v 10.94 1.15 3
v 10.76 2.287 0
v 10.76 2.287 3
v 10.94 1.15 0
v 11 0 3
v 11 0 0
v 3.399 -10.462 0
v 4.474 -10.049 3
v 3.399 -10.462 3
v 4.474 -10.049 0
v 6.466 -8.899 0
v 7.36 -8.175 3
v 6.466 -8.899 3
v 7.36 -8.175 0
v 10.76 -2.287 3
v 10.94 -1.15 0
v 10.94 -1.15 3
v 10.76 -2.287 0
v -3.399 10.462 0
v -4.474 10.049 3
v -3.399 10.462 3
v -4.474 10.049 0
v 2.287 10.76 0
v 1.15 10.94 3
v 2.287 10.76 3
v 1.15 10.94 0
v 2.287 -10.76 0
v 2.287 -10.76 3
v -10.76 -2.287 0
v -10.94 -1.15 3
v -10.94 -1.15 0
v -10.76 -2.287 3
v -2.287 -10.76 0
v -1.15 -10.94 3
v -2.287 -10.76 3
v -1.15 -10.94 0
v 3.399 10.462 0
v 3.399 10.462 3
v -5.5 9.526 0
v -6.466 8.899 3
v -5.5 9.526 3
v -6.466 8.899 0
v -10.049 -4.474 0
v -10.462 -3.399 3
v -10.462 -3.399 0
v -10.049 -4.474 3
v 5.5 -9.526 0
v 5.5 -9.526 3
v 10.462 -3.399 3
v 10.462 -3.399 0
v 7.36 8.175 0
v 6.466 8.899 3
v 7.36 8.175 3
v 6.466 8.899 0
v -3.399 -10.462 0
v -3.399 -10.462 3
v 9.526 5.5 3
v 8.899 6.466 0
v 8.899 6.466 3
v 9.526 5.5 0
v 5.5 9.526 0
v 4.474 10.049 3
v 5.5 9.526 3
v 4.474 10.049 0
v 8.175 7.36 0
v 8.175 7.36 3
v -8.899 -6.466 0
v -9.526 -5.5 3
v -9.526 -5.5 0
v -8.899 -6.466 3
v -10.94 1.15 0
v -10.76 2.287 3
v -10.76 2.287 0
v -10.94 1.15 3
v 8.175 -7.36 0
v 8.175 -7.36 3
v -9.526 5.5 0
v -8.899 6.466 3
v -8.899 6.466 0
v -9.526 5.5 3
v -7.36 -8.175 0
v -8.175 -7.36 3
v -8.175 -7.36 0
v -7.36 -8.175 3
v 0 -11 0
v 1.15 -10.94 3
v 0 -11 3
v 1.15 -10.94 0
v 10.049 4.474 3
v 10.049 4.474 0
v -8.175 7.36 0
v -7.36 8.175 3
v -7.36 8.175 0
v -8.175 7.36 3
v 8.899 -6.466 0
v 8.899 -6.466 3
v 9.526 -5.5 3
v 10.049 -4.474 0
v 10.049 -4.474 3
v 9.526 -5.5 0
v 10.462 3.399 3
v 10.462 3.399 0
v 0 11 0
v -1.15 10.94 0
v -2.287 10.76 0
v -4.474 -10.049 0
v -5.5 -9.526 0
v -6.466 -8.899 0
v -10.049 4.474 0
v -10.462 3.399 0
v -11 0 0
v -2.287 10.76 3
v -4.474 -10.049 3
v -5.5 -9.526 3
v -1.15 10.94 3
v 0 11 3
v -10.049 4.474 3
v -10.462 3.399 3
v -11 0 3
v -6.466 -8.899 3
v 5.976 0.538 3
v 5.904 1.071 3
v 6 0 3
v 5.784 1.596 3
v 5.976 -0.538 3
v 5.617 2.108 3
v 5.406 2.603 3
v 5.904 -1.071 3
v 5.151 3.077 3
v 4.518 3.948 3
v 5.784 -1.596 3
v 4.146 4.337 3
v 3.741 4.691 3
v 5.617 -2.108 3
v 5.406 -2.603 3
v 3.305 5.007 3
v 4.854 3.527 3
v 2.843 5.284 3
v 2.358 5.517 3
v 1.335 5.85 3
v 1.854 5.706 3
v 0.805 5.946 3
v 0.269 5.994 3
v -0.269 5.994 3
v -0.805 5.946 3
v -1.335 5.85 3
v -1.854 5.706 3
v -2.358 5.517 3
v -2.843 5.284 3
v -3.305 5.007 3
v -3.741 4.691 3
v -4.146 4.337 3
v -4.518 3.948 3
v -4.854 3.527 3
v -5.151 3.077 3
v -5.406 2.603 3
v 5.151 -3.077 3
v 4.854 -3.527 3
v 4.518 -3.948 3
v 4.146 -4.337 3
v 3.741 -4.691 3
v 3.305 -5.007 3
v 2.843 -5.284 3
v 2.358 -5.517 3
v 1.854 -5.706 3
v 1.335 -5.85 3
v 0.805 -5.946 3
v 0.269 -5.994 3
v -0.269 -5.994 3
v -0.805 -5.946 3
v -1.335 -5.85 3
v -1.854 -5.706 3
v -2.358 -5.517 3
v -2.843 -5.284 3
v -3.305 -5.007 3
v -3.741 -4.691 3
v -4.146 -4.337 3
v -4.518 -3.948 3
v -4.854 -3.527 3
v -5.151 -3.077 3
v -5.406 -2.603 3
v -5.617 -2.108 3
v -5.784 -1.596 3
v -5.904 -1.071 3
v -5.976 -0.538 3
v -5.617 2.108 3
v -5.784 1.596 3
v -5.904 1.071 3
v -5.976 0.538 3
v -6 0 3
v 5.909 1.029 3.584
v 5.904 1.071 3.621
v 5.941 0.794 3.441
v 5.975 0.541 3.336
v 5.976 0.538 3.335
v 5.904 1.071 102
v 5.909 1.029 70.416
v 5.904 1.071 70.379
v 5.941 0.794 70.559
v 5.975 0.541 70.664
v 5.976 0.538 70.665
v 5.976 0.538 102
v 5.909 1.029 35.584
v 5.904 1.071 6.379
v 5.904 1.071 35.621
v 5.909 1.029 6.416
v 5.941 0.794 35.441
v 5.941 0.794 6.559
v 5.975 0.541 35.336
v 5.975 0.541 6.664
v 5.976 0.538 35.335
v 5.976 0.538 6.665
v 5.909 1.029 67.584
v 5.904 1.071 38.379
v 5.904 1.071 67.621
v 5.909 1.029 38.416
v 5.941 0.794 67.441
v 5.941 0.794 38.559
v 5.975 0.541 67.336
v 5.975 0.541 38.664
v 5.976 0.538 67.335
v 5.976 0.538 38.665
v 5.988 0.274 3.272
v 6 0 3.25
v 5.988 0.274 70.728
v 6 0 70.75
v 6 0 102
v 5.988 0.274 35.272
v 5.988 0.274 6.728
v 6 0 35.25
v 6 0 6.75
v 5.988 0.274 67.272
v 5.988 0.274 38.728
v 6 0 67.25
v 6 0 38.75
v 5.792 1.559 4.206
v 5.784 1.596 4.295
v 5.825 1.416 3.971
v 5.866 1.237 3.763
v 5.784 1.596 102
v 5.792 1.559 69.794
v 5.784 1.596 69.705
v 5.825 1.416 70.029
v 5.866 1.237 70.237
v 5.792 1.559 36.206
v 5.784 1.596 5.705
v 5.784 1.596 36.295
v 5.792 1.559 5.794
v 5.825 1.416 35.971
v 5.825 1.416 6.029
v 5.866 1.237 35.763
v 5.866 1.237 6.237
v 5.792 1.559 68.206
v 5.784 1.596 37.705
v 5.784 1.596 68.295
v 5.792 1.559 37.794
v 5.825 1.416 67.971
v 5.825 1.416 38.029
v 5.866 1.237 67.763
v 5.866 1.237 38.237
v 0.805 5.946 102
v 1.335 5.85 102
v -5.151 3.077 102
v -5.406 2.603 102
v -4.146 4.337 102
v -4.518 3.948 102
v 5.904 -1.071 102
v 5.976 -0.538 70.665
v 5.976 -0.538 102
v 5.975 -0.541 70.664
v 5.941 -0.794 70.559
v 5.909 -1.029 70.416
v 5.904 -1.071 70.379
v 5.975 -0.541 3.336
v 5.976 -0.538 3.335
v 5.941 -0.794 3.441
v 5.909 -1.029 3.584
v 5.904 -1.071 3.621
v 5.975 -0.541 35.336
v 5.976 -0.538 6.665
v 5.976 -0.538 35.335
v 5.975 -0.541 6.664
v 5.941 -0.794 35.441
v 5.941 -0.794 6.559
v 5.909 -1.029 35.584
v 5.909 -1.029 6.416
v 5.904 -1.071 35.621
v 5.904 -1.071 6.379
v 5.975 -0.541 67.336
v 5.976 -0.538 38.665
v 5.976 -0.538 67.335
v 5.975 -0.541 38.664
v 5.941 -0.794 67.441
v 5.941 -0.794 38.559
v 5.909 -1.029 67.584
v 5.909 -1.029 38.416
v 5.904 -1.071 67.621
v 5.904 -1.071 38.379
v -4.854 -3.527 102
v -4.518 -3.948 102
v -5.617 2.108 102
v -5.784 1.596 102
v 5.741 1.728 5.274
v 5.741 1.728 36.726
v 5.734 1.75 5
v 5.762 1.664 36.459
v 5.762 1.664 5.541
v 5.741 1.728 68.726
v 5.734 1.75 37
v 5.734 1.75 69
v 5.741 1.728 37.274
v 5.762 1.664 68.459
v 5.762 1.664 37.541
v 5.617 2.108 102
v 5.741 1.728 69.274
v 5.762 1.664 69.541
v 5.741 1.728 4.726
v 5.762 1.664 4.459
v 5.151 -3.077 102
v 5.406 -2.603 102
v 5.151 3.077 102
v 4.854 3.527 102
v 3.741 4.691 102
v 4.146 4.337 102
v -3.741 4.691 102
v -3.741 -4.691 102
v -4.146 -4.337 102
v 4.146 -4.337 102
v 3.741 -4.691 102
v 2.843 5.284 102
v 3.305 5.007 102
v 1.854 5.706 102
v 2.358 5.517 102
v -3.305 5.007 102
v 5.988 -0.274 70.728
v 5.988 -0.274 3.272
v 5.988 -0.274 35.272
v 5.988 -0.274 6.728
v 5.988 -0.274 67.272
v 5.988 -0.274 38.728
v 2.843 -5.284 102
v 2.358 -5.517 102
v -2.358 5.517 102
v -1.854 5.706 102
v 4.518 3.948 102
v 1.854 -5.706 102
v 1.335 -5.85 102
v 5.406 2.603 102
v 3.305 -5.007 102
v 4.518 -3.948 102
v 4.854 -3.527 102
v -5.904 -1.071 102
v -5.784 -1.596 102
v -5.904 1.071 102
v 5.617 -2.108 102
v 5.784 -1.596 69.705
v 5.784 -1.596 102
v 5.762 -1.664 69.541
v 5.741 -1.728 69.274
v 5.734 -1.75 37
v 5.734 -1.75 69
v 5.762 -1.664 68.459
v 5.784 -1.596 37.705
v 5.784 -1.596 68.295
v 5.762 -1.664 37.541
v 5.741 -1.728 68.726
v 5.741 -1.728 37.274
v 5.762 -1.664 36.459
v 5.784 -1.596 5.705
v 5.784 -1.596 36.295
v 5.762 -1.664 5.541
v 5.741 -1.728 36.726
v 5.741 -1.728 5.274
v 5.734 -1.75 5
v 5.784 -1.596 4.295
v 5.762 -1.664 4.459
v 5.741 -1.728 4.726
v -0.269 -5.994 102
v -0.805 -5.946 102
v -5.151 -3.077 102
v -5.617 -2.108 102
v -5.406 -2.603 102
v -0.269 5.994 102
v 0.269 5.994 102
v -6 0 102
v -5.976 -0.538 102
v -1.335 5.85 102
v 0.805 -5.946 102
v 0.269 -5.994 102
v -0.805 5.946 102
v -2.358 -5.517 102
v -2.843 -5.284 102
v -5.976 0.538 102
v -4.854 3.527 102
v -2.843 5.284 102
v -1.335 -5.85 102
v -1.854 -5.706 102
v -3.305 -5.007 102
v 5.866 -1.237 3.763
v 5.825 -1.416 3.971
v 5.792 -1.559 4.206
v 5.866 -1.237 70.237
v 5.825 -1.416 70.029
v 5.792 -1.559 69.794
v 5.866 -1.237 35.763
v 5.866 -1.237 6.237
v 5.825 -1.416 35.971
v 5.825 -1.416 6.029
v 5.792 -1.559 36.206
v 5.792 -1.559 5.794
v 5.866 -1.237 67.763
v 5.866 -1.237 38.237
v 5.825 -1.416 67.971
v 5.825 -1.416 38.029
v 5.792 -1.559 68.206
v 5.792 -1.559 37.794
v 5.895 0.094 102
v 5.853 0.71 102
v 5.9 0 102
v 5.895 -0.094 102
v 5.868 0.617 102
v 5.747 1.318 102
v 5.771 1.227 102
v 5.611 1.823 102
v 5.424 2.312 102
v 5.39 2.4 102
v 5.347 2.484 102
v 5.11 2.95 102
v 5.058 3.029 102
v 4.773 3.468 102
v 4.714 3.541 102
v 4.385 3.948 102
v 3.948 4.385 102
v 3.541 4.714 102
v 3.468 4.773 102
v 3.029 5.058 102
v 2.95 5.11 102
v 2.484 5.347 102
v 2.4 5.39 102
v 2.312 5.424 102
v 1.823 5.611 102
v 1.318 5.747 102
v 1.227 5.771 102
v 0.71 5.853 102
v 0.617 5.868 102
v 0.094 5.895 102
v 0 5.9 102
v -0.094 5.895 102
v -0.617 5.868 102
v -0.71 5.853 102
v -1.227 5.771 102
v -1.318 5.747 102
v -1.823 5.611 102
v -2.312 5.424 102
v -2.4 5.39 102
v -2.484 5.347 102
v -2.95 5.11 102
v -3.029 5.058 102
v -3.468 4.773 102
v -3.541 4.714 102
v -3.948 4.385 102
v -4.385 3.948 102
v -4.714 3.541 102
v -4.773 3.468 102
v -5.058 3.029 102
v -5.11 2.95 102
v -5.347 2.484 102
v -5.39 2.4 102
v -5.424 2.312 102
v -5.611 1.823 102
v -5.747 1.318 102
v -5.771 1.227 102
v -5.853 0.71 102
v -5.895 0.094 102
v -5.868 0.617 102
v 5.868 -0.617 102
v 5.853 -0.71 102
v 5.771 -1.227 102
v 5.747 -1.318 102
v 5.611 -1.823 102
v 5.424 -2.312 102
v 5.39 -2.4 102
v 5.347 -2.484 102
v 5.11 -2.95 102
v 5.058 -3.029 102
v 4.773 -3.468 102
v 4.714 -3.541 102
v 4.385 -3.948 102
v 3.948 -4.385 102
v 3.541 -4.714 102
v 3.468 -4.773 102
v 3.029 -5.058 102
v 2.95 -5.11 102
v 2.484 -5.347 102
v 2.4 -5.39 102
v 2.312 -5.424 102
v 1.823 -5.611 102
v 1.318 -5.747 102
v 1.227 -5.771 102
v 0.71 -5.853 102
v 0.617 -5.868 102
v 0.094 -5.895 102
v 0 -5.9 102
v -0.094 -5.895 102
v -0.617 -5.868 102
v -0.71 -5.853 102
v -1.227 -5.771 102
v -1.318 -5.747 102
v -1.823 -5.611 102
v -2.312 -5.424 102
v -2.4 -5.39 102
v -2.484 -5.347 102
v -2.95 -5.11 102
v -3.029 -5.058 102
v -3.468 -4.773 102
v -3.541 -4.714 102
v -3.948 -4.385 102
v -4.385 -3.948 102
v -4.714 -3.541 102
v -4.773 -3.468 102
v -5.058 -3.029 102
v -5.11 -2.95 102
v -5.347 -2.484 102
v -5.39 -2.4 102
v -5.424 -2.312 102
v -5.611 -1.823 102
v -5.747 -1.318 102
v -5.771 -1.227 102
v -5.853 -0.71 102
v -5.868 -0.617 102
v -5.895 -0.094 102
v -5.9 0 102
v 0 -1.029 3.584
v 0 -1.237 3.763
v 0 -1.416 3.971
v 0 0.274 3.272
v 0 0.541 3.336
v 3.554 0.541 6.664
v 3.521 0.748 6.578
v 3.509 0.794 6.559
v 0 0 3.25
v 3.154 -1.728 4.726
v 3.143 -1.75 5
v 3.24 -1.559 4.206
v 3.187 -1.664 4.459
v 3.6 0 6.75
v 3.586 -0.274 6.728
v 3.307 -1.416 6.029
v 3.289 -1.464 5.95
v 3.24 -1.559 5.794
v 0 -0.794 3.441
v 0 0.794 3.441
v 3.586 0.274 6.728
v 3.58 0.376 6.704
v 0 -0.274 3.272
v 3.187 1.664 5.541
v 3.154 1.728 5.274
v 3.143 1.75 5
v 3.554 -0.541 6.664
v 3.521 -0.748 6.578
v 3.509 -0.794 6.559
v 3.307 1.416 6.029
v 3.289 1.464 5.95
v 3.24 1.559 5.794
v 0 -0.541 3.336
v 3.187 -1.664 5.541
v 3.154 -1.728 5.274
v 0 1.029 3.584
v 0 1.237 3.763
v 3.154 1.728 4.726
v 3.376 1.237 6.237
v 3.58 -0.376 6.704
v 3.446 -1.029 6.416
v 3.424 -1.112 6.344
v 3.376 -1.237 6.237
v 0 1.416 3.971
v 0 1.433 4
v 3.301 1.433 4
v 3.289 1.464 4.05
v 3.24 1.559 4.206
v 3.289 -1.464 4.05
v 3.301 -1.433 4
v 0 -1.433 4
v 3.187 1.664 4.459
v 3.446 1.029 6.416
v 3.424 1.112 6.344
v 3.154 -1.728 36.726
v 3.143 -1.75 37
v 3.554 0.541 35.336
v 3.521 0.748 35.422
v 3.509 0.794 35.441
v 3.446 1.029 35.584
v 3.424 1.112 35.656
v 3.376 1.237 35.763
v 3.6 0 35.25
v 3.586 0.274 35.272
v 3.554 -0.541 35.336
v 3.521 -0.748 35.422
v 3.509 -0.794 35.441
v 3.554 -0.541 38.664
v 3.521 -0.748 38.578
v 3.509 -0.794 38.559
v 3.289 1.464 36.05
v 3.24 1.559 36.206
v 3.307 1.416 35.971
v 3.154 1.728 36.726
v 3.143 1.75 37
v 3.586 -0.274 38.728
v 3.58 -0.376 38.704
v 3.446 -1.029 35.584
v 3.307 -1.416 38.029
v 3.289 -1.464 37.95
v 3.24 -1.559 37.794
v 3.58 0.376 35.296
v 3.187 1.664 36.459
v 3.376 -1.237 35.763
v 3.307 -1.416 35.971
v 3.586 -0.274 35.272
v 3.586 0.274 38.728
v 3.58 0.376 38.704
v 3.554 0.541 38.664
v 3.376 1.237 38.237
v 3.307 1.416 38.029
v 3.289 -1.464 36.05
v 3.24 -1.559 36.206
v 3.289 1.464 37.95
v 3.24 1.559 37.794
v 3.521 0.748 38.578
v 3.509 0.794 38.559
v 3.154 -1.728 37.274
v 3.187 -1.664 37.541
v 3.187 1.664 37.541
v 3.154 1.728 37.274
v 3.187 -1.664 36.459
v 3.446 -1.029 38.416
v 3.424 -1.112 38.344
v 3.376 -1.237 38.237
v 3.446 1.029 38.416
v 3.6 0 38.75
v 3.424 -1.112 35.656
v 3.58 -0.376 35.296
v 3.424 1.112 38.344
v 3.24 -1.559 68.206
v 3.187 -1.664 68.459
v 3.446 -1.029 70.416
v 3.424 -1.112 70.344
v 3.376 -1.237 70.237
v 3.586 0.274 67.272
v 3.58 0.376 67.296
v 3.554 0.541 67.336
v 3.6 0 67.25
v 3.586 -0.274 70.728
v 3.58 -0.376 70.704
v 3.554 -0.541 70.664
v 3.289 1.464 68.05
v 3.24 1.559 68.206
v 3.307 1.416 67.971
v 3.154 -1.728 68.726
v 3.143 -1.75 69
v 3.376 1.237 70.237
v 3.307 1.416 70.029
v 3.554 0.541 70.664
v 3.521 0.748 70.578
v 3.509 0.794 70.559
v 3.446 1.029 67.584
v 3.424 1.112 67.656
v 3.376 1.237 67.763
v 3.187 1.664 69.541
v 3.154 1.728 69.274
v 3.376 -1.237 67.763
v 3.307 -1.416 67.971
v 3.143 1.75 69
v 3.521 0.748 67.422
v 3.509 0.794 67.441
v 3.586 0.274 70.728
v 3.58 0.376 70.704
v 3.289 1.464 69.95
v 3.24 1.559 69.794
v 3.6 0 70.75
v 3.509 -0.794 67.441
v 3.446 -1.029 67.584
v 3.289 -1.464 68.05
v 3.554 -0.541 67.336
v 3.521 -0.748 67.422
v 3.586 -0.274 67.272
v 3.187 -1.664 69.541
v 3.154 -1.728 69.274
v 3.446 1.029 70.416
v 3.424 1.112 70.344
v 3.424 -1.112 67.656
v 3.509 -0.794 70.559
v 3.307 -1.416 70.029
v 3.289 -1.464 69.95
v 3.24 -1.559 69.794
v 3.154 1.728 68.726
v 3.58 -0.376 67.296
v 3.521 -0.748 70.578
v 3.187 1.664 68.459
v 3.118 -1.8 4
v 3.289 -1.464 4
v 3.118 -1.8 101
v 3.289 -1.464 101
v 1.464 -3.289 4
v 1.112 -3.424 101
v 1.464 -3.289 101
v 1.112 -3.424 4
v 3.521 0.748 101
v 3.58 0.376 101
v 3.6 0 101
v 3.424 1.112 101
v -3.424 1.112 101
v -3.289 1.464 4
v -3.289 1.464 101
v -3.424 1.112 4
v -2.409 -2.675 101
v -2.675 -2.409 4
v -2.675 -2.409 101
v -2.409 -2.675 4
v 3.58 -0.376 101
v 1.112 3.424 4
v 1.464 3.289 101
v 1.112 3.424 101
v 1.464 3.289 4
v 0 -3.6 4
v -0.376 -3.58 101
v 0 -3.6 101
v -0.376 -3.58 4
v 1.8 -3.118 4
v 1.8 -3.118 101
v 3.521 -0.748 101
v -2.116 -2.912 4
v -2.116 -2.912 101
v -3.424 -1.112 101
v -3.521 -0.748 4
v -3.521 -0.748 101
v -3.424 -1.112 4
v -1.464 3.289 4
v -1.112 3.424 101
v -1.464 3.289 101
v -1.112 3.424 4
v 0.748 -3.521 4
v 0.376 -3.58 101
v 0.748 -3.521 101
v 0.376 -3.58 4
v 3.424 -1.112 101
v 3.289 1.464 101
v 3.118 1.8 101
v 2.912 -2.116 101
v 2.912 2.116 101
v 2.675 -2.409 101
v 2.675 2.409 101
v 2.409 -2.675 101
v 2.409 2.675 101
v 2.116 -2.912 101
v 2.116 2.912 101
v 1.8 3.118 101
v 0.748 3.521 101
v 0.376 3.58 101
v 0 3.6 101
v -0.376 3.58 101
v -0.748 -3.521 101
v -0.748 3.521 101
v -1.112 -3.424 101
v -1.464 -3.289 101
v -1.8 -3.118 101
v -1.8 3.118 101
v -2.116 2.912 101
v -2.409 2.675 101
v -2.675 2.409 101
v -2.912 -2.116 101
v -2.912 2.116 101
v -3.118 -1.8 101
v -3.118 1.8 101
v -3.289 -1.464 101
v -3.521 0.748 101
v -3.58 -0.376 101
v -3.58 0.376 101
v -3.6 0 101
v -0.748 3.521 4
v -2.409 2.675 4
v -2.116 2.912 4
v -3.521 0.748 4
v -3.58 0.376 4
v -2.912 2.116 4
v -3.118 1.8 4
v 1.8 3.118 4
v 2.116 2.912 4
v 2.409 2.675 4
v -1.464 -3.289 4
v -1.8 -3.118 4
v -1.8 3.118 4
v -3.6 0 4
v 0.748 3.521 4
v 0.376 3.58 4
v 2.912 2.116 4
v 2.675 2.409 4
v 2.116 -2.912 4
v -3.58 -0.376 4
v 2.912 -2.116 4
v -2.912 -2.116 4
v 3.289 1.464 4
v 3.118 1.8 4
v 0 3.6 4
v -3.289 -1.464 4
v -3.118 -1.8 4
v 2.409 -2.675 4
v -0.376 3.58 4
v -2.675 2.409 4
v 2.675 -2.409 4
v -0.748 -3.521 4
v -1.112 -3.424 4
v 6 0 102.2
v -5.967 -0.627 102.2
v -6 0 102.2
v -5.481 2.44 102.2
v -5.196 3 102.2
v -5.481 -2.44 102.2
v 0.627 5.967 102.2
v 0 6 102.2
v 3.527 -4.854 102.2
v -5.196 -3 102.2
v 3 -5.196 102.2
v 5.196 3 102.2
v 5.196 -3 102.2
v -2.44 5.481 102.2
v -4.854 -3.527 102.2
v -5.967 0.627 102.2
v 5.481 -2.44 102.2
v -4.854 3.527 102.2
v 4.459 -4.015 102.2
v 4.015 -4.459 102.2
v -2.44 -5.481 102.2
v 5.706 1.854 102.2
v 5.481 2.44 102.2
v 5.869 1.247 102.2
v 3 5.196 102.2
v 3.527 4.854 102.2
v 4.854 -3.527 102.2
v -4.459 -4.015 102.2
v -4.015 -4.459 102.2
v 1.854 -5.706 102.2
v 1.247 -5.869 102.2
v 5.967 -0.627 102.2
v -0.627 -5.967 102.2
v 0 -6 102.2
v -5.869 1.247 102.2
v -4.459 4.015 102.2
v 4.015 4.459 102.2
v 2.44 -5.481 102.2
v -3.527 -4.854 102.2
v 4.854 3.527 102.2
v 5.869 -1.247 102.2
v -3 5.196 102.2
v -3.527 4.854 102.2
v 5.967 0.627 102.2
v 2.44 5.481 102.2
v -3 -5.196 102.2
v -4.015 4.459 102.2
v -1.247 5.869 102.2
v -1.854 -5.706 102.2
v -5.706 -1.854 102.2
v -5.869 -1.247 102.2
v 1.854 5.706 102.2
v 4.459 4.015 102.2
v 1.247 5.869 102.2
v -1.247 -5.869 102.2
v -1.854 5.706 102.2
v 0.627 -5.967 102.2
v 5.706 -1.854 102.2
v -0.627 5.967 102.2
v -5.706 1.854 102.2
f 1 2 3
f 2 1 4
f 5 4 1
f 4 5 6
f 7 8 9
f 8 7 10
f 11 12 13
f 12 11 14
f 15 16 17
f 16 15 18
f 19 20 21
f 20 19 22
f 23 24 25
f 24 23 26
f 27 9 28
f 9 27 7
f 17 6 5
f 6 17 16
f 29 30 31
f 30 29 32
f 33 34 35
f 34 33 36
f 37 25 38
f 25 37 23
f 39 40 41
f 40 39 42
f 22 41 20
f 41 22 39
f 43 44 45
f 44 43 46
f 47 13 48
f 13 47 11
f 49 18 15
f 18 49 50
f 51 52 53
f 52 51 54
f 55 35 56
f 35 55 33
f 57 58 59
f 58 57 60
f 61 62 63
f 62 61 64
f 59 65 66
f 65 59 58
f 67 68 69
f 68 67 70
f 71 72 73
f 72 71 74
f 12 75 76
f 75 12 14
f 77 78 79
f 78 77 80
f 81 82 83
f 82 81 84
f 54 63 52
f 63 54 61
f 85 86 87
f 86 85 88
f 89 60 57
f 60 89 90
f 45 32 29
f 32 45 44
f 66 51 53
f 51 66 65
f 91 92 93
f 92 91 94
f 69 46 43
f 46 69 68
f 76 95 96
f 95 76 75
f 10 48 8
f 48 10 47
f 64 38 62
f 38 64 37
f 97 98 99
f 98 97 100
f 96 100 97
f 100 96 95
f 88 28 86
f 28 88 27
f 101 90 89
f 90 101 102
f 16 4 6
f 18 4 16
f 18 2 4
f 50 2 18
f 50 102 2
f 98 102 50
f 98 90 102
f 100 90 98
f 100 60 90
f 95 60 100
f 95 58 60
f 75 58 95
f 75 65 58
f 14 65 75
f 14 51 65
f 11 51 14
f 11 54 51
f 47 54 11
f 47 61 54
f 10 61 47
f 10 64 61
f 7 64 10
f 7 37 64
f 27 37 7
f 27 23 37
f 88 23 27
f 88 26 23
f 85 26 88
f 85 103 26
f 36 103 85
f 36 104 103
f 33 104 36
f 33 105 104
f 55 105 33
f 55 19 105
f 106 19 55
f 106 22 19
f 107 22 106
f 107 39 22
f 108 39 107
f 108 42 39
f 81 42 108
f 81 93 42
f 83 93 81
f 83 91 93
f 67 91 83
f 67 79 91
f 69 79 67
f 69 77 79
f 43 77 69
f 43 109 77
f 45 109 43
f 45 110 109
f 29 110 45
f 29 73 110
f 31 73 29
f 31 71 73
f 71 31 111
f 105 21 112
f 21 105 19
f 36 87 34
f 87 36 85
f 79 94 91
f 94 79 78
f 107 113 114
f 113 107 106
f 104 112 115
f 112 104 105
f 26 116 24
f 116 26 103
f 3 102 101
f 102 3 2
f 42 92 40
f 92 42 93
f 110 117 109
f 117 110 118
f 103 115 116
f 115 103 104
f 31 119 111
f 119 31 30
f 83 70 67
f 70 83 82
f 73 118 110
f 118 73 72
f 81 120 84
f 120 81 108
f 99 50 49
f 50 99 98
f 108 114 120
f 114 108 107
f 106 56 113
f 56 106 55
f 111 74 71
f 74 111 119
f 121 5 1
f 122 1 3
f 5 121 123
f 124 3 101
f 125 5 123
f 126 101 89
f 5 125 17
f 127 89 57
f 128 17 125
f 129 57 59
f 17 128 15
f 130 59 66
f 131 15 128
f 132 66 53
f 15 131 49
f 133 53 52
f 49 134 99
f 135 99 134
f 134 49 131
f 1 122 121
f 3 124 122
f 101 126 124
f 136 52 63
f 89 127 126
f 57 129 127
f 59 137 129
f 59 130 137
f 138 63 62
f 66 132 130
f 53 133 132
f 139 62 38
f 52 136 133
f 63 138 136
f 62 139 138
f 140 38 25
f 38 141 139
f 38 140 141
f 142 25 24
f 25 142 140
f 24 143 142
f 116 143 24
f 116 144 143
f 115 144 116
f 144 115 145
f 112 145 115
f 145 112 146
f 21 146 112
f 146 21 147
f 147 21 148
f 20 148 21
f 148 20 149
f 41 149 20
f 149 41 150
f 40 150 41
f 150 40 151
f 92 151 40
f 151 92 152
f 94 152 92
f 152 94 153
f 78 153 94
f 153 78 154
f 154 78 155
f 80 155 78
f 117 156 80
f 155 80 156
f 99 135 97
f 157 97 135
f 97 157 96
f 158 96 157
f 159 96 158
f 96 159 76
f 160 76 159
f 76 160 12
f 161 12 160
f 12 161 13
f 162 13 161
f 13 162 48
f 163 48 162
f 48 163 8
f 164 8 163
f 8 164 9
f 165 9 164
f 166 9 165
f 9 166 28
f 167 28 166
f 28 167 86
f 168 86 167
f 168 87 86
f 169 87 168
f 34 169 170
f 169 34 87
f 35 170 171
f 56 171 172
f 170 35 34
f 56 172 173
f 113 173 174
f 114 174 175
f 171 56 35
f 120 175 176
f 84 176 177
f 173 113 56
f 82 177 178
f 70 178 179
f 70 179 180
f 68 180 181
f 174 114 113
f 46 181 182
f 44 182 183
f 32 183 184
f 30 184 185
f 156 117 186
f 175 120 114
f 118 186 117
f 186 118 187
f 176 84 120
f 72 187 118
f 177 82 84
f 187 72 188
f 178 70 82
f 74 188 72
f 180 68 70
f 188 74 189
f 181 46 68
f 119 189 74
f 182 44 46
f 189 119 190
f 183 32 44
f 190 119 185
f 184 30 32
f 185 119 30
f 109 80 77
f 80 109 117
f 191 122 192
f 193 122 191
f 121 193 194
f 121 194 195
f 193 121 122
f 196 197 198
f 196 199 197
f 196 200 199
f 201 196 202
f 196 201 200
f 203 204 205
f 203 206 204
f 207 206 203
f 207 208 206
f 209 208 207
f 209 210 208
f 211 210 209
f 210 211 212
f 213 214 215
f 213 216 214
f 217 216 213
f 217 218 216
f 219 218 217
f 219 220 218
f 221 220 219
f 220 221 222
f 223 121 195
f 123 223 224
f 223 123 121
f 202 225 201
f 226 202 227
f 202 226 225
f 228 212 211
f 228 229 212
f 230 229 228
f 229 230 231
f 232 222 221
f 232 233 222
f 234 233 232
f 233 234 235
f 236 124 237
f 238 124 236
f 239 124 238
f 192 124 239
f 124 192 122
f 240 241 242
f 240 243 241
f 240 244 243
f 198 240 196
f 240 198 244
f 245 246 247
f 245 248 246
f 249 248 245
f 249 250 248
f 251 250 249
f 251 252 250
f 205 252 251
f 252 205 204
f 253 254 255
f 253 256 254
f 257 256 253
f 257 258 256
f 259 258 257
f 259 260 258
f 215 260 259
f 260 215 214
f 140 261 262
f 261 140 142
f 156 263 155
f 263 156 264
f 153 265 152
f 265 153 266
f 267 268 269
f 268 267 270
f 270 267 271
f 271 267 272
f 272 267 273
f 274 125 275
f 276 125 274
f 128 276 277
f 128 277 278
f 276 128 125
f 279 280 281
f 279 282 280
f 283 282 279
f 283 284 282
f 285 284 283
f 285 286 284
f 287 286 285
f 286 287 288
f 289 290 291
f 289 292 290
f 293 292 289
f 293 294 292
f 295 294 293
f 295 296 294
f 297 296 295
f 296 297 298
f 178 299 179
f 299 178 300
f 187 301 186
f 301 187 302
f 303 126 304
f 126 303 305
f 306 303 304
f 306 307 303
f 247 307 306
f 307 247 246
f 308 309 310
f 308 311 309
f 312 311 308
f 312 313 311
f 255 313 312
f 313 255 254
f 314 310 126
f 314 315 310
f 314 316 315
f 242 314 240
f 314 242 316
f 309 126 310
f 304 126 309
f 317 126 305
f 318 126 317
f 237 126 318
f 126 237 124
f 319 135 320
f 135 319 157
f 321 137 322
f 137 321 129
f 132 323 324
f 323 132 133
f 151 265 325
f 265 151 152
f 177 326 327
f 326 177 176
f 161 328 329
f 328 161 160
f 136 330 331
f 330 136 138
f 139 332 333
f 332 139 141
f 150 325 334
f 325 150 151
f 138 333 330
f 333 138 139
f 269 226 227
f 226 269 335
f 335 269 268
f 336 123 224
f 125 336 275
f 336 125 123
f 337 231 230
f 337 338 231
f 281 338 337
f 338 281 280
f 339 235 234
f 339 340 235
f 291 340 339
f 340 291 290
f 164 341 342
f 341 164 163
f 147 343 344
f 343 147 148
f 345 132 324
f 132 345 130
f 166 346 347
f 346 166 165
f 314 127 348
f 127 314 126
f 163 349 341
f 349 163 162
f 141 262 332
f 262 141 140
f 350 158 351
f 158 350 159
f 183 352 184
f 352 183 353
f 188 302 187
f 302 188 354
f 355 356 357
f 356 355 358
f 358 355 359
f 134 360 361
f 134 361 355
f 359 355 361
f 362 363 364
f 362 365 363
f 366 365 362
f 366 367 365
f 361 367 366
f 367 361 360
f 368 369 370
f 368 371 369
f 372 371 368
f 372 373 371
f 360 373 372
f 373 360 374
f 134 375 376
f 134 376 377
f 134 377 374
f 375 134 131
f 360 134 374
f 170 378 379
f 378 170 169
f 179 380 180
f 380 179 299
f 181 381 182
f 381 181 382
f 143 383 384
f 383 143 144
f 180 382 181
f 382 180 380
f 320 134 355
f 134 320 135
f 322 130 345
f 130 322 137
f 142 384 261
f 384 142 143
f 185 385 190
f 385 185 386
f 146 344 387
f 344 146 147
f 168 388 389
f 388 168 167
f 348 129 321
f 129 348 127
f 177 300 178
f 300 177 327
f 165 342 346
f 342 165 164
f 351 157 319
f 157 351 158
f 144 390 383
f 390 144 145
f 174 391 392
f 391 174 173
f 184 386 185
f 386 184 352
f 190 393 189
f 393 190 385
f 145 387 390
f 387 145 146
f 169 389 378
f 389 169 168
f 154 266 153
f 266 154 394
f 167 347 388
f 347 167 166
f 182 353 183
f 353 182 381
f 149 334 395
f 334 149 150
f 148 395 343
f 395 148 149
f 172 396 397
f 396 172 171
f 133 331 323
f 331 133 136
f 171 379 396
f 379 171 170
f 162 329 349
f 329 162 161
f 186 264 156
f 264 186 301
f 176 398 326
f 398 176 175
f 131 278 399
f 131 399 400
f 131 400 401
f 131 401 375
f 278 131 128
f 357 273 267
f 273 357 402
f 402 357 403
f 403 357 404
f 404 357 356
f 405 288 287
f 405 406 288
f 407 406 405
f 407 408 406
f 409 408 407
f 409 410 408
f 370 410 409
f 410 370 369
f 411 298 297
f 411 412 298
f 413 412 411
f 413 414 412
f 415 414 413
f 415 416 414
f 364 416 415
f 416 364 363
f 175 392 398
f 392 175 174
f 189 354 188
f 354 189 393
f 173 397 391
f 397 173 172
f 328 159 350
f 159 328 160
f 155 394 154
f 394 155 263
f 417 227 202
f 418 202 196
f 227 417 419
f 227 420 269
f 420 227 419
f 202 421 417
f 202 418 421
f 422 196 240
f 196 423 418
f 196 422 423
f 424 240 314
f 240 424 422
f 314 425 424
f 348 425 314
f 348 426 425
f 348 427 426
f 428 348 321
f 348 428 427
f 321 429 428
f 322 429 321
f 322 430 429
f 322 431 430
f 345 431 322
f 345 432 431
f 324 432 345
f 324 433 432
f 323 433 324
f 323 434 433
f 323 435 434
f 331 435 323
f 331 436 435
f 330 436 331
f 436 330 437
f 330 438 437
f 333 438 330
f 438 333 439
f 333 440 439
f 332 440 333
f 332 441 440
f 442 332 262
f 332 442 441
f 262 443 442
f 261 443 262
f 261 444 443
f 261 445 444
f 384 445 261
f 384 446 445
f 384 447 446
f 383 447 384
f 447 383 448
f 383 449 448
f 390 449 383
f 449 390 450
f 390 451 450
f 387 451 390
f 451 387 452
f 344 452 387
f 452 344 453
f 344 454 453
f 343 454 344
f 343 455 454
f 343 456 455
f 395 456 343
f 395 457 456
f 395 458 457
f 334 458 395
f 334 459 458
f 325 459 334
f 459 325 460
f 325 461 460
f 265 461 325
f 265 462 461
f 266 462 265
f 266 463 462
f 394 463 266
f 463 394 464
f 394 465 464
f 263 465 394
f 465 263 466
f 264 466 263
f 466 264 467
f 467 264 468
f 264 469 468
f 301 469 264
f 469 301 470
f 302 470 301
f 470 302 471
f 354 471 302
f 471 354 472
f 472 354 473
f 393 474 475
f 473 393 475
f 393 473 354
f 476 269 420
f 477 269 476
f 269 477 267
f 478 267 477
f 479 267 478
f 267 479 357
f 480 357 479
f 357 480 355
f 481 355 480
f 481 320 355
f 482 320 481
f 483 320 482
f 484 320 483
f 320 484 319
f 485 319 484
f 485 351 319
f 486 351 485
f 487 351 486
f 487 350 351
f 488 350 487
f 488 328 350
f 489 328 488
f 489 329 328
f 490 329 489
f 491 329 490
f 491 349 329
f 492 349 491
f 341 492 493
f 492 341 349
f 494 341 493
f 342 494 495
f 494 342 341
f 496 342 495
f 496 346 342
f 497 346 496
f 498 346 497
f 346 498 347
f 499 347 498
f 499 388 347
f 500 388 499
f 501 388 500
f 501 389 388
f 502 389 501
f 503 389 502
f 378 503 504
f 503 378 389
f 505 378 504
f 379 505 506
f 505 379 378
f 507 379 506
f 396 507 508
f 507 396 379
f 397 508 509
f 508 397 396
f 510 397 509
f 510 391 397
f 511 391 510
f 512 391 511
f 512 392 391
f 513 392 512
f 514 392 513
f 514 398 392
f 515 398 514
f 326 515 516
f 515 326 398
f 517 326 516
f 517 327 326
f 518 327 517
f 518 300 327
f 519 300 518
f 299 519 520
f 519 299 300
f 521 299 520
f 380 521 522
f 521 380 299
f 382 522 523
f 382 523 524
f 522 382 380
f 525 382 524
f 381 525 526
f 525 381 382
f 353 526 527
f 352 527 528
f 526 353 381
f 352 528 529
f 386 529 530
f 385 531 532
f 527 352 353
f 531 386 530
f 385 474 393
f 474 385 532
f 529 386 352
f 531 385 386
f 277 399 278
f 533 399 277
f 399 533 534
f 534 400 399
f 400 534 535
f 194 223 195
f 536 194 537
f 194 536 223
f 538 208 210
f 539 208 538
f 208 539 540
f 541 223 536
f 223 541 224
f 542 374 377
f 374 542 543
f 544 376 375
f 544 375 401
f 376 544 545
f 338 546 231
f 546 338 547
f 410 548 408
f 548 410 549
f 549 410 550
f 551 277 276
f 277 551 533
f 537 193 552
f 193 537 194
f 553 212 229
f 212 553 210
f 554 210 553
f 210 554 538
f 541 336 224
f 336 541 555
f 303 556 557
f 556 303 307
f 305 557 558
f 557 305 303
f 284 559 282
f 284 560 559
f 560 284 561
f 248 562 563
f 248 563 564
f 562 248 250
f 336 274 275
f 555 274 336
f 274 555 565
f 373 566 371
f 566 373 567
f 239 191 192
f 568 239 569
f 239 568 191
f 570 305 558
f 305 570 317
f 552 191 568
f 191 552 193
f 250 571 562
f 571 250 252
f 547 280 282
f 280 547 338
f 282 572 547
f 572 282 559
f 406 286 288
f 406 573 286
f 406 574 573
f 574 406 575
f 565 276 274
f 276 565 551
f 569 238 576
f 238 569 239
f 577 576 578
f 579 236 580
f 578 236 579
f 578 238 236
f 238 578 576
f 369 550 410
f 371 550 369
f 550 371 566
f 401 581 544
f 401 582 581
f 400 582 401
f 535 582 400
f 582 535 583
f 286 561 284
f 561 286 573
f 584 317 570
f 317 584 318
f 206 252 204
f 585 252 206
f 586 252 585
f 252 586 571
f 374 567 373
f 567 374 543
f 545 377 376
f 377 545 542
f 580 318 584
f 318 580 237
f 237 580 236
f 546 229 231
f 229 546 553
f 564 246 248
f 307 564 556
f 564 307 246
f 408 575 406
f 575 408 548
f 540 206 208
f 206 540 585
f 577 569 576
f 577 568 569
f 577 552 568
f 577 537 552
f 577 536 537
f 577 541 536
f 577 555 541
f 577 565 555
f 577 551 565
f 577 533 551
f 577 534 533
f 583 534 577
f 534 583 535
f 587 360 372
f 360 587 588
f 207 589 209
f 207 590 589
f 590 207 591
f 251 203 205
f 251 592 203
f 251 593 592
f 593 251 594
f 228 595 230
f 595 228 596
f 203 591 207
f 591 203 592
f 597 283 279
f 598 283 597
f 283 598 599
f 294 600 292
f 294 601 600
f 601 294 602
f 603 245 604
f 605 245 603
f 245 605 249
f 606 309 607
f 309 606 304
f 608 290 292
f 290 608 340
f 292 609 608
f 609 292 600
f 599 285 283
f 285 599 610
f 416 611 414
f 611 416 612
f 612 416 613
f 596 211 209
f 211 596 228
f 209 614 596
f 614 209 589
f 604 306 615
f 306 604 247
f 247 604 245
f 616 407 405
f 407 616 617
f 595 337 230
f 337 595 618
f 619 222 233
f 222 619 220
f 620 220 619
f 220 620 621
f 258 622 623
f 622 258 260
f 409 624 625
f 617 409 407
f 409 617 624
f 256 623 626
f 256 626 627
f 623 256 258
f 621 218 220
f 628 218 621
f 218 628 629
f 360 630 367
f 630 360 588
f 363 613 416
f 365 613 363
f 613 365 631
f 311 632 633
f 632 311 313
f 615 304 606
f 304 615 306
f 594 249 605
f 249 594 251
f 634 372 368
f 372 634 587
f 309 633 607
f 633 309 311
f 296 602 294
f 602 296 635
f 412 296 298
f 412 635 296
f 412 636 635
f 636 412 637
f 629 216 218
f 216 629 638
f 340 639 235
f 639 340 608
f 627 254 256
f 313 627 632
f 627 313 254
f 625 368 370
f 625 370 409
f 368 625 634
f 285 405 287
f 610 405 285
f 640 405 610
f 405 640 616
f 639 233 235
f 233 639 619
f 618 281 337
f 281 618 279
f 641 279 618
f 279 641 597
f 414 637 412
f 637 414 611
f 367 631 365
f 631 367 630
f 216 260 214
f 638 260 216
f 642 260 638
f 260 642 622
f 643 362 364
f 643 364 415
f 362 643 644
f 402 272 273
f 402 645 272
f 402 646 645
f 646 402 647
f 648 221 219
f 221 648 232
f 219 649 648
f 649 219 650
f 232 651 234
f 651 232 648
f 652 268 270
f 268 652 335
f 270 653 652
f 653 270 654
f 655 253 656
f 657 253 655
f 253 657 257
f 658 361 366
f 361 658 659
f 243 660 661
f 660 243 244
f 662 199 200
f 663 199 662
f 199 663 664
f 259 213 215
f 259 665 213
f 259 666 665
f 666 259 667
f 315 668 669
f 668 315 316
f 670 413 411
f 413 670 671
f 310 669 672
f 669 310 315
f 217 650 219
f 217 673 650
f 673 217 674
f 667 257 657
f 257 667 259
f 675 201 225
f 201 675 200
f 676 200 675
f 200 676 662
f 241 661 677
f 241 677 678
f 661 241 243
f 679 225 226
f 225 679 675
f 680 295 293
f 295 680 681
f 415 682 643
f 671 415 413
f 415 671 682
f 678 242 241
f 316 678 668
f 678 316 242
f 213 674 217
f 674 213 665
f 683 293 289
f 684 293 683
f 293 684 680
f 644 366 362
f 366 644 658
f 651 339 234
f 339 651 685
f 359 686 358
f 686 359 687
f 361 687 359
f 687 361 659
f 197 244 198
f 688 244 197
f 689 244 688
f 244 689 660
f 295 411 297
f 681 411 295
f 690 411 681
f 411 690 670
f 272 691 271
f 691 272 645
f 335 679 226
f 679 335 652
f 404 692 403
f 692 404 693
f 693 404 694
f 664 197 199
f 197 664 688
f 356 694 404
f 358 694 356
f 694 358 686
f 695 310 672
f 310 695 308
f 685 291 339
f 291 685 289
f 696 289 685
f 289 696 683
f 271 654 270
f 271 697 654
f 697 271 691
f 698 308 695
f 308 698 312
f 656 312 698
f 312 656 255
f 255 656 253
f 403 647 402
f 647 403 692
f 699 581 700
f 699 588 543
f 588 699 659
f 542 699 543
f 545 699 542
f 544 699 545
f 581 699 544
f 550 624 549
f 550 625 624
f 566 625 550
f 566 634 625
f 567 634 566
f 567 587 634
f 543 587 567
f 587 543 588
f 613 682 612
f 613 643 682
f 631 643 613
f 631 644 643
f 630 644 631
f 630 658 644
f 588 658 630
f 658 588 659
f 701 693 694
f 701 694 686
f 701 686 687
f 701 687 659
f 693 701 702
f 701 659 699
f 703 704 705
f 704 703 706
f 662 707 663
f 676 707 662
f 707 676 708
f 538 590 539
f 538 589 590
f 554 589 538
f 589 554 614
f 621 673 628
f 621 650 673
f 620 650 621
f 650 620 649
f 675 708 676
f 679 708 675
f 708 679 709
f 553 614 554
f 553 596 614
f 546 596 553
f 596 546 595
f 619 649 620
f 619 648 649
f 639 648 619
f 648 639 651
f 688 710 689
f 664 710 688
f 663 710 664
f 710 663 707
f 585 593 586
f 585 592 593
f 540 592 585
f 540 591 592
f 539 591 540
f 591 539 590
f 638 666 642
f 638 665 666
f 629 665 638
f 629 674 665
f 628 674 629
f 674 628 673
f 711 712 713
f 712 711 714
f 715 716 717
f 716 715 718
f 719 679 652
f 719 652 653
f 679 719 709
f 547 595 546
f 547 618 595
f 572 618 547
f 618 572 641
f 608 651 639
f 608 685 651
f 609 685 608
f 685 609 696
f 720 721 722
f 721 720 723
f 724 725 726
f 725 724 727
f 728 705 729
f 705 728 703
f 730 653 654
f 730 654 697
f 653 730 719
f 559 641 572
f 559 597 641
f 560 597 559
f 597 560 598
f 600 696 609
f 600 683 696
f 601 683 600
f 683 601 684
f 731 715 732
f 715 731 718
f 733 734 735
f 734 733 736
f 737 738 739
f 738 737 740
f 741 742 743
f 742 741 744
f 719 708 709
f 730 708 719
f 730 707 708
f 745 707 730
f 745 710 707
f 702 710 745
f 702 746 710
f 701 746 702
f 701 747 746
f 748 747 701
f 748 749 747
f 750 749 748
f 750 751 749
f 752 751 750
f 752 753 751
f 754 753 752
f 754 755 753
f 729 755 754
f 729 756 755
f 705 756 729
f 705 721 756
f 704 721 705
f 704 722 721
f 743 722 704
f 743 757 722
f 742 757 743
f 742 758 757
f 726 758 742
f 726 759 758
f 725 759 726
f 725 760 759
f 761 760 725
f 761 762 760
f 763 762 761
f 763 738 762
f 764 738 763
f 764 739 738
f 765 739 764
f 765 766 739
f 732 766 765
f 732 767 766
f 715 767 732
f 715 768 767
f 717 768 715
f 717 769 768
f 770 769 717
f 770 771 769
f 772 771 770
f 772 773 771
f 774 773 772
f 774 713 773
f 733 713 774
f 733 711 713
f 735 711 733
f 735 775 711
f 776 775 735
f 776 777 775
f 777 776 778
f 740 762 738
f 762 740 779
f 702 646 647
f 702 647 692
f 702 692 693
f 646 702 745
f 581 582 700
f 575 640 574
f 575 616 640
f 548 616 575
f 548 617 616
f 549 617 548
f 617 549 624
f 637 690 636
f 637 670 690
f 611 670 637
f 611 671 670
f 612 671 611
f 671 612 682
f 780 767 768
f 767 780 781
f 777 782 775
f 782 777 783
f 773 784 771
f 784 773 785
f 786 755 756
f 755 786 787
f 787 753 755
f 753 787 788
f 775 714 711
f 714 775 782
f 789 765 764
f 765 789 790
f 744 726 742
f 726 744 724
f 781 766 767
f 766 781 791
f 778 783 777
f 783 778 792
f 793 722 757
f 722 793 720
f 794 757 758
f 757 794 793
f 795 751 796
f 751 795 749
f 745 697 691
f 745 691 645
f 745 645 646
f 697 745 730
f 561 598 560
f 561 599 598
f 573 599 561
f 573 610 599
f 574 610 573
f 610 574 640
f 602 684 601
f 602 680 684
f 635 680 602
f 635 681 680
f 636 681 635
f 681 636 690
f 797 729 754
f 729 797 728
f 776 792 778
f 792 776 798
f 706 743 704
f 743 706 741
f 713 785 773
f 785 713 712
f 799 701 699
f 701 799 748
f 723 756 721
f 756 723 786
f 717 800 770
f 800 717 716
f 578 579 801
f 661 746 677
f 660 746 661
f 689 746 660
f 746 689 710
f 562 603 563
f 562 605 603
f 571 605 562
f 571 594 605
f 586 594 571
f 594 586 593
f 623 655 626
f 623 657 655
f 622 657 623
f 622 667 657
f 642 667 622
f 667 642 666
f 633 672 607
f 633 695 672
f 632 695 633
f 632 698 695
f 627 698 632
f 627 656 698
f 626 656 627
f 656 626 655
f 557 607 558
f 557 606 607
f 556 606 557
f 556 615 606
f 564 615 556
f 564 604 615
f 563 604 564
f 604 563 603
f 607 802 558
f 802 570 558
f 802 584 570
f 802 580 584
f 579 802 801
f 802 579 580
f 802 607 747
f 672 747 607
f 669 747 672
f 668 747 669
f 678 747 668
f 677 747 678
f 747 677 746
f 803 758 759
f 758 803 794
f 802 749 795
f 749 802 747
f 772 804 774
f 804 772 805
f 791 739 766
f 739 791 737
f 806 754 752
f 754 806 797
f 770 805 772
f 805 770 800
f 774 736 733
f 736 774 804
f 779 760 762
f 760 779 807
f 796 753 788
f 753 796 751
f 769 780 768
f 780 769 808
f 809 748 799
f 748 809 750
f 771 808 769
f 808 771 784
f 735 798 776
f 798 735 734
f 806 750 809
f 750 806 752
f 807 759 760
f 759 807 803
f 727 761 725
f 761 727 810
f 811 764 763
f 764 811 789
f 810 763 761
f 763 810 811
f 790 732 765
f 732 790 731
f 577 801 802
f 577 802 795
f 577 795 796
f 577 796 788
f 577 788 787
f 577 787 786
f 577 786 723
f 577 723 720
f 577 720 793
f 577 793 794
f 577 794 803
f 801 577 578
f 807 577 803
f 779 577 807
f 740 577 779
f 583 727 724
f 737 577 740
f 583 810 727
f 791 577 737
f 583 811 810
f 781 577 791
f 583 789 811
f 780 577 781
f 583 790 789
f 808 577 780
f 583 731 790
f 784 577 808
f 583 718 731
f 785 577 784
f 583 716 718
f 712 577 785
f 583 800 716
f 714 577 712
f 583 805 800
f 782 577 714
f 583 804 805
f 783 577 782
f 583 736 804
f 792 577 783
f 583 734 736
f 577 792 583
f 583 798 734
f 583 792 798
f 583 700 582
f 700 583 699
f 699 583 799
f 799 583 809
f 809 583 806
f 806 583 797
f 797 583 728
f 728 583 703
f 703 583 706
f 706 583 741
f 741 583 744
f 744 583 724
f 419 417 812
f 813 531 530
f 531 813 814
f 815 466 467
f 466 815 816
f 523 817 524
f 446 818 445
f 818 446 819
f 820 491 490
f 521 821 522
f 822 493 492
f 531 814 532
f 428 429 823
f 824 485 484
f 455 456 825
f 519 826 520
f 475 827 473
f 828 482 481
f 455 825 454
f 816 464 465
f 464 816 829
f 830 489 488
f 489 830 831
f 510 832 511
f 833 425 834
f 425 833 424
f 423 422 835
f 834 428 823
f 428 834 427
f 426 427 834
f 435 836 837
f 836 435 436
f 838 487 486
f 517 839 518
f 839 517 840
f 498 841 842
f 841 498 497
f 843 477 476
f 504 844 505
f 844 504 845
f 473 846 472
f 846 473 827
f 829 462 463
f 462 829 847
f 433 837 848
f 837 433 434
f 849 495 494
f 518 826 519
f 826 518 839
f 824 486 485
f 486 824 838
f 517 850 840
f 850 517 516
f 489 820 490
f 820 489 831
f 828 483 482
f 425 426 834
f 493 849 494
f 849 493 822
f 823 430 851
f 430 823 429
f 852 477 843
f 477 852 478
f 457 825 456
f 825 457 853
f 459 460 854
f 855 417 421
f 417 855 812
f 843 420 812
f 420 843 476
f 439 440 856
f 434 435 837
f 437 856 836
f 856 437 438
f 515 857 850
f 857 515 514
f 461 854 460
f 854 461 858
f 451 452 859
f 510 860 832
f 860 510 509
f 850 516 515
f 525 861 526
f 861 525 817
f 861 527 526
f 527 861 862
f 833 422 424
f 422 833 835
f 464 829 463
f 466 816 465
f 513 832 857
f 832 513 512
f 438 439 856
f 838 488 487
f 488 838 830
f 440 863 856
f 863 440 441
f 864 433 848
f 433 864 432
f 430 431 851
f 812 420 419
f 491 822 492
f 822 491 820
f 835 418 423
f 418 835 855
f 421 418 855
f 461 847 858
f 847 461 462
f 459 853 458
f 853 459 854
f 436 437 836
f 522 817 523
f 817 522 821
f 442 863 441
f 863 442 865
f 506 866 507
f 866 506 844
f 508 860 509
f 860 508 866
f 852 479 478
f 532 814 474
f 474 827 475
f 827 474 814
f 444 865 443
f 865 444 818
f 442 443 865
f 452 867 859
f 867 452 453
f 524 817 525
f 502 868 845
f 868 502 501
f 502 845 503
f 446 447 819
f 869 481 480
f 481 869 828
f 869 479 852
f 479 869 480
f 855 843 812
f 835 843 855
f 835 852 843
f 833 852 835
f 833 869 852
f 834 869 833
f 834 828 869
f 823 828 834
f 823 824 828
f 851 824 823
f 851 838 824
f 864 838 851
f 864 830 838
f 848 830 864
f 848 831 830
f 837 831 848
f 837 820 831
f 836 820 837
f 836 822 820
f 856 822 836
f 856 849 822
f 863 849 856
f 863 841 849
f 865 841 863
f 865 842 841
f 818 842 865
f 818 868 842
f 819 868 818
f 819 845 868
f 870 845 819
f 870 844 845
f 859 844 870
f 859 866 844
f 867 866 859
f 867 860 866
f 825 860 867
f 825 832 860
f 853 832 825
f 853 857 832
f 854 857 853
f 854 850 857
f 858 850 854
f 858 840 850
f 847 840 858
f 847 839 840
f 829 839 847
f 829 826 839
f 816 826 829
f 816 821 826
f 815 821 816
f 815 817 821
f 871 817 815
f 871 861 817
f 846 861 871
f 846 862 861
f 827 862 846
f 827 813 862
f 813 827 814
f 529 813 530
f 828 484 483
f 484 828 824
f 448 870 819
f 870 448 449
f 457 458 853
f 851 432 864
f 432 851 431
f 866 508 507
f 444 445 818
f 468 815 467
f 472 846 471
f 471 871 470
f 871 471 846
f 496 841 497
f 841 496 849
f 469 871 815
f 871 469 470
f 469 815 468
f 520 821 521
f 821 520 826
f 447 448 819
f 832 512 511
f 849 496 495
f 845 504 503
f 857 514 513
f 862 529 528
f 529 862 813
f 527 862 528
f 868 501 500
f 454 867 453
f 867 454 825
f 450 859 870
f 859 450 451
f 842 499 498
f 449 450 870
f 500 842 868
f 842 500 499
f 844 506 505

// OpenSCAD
column_mode = is_undef(column_mode) ? "printed" : column_mode;
levels = is_undef(levels) ? 3 : levels;
z_gap_clear = is_undef(z_gap_clear) ? 32 : z_gap_clear;
column_od = is_undef(column_od) ? 12 : column_od;
column_wall = is_undef(column_wall) ? 2.4 : column_wall;
carrier_insert_od = is_undef(carrier_insert_od) ? 3.5 : carrier_insert_od;
carrier_insert_L = is_undef(carrier_insert_L) ? 4.0 : carrier_insert_L;
foot_diameter = is_undef(foot_diameter) ? 22 : foot_diameter;
foot_height = is_undef(foot_height) ? 3 : foot_height;
cap_height = is_undef(cap_height) ? 3 : cap_height;
emit_dimension_report =
    is_undef(emit_dimension_report) ? false : emit_dimension_report;

column_radius = column_od / 2;
inner_radius = column_radius - column_wall;
column_height = levels * z_gap_clear + cap_height;

module _column_shell() {
    union() {
        cylinder(h = foot_height, r = foot_diameter / 2, $fn = 60);
        translate([0, 0, foot_height])
            cylinder(h = column_height, r = column_radius, $fn = 70);
    }
}

module _column_interior() {
    if (column_mode == "printed") {
        translate([0, 0, foot_height + 1])
            cylinder(h = column_height - 2, r = max(inner_radius, 1.2), $fn = 60);
    } else {
        translate([0, 0, foot_height])
            cylinder(h = column_height, r = carrier_insert_od / 2 + 0.6, $fn = 50);
    }
}

module _column_radial_bores() {
    for (level = [0 : levels - 1]) {
        z_pos = foot_height + level * z_gap_clear + carrier_insert_L / 2;
        translate([0, 0, z_pos])
            rotate([0, 90, 0])
                cylinder(h = column_od + 4, r = carrier_insert_od / 2, $fn = 40);
    }
}

module pi_carrier_column(
    column_mode = column_mode,
    levels = levels,
    z_gap_clear = z_gap_clear,
    column_od = column_od,
    column_wall = column_wall,
    carrier_insert_od = carrier_insert_od,
    carrier_insert_L = carrier_insert_L,
    emit_dimension_report = emit_dimension_report
) {
    difference() {
        _column_shell();
        union() {
            _column_interior();
            _column_radial_bores();
        }
    }

    // Add a locating chamfer on top for easier carrier placement.
    translate([0, 0, foot_height + column_height - 1])
        cylinder(h = 1.2, r1 = column_radius - 0.6, r2 = column_radius, $fn = 60);

    if (emit_dimension_report) {
        echo(
            "pi_carrier_column",
            levels = levels,
            z_gap_clear = z_gap_clear,
            column_height = column_height,
            column_od = column_od,
            column_wall = column_wall,
            foot_diameter = foot_diameter,
            column_mode = column_mode
        );
    }
}

pi_carrier_column();
